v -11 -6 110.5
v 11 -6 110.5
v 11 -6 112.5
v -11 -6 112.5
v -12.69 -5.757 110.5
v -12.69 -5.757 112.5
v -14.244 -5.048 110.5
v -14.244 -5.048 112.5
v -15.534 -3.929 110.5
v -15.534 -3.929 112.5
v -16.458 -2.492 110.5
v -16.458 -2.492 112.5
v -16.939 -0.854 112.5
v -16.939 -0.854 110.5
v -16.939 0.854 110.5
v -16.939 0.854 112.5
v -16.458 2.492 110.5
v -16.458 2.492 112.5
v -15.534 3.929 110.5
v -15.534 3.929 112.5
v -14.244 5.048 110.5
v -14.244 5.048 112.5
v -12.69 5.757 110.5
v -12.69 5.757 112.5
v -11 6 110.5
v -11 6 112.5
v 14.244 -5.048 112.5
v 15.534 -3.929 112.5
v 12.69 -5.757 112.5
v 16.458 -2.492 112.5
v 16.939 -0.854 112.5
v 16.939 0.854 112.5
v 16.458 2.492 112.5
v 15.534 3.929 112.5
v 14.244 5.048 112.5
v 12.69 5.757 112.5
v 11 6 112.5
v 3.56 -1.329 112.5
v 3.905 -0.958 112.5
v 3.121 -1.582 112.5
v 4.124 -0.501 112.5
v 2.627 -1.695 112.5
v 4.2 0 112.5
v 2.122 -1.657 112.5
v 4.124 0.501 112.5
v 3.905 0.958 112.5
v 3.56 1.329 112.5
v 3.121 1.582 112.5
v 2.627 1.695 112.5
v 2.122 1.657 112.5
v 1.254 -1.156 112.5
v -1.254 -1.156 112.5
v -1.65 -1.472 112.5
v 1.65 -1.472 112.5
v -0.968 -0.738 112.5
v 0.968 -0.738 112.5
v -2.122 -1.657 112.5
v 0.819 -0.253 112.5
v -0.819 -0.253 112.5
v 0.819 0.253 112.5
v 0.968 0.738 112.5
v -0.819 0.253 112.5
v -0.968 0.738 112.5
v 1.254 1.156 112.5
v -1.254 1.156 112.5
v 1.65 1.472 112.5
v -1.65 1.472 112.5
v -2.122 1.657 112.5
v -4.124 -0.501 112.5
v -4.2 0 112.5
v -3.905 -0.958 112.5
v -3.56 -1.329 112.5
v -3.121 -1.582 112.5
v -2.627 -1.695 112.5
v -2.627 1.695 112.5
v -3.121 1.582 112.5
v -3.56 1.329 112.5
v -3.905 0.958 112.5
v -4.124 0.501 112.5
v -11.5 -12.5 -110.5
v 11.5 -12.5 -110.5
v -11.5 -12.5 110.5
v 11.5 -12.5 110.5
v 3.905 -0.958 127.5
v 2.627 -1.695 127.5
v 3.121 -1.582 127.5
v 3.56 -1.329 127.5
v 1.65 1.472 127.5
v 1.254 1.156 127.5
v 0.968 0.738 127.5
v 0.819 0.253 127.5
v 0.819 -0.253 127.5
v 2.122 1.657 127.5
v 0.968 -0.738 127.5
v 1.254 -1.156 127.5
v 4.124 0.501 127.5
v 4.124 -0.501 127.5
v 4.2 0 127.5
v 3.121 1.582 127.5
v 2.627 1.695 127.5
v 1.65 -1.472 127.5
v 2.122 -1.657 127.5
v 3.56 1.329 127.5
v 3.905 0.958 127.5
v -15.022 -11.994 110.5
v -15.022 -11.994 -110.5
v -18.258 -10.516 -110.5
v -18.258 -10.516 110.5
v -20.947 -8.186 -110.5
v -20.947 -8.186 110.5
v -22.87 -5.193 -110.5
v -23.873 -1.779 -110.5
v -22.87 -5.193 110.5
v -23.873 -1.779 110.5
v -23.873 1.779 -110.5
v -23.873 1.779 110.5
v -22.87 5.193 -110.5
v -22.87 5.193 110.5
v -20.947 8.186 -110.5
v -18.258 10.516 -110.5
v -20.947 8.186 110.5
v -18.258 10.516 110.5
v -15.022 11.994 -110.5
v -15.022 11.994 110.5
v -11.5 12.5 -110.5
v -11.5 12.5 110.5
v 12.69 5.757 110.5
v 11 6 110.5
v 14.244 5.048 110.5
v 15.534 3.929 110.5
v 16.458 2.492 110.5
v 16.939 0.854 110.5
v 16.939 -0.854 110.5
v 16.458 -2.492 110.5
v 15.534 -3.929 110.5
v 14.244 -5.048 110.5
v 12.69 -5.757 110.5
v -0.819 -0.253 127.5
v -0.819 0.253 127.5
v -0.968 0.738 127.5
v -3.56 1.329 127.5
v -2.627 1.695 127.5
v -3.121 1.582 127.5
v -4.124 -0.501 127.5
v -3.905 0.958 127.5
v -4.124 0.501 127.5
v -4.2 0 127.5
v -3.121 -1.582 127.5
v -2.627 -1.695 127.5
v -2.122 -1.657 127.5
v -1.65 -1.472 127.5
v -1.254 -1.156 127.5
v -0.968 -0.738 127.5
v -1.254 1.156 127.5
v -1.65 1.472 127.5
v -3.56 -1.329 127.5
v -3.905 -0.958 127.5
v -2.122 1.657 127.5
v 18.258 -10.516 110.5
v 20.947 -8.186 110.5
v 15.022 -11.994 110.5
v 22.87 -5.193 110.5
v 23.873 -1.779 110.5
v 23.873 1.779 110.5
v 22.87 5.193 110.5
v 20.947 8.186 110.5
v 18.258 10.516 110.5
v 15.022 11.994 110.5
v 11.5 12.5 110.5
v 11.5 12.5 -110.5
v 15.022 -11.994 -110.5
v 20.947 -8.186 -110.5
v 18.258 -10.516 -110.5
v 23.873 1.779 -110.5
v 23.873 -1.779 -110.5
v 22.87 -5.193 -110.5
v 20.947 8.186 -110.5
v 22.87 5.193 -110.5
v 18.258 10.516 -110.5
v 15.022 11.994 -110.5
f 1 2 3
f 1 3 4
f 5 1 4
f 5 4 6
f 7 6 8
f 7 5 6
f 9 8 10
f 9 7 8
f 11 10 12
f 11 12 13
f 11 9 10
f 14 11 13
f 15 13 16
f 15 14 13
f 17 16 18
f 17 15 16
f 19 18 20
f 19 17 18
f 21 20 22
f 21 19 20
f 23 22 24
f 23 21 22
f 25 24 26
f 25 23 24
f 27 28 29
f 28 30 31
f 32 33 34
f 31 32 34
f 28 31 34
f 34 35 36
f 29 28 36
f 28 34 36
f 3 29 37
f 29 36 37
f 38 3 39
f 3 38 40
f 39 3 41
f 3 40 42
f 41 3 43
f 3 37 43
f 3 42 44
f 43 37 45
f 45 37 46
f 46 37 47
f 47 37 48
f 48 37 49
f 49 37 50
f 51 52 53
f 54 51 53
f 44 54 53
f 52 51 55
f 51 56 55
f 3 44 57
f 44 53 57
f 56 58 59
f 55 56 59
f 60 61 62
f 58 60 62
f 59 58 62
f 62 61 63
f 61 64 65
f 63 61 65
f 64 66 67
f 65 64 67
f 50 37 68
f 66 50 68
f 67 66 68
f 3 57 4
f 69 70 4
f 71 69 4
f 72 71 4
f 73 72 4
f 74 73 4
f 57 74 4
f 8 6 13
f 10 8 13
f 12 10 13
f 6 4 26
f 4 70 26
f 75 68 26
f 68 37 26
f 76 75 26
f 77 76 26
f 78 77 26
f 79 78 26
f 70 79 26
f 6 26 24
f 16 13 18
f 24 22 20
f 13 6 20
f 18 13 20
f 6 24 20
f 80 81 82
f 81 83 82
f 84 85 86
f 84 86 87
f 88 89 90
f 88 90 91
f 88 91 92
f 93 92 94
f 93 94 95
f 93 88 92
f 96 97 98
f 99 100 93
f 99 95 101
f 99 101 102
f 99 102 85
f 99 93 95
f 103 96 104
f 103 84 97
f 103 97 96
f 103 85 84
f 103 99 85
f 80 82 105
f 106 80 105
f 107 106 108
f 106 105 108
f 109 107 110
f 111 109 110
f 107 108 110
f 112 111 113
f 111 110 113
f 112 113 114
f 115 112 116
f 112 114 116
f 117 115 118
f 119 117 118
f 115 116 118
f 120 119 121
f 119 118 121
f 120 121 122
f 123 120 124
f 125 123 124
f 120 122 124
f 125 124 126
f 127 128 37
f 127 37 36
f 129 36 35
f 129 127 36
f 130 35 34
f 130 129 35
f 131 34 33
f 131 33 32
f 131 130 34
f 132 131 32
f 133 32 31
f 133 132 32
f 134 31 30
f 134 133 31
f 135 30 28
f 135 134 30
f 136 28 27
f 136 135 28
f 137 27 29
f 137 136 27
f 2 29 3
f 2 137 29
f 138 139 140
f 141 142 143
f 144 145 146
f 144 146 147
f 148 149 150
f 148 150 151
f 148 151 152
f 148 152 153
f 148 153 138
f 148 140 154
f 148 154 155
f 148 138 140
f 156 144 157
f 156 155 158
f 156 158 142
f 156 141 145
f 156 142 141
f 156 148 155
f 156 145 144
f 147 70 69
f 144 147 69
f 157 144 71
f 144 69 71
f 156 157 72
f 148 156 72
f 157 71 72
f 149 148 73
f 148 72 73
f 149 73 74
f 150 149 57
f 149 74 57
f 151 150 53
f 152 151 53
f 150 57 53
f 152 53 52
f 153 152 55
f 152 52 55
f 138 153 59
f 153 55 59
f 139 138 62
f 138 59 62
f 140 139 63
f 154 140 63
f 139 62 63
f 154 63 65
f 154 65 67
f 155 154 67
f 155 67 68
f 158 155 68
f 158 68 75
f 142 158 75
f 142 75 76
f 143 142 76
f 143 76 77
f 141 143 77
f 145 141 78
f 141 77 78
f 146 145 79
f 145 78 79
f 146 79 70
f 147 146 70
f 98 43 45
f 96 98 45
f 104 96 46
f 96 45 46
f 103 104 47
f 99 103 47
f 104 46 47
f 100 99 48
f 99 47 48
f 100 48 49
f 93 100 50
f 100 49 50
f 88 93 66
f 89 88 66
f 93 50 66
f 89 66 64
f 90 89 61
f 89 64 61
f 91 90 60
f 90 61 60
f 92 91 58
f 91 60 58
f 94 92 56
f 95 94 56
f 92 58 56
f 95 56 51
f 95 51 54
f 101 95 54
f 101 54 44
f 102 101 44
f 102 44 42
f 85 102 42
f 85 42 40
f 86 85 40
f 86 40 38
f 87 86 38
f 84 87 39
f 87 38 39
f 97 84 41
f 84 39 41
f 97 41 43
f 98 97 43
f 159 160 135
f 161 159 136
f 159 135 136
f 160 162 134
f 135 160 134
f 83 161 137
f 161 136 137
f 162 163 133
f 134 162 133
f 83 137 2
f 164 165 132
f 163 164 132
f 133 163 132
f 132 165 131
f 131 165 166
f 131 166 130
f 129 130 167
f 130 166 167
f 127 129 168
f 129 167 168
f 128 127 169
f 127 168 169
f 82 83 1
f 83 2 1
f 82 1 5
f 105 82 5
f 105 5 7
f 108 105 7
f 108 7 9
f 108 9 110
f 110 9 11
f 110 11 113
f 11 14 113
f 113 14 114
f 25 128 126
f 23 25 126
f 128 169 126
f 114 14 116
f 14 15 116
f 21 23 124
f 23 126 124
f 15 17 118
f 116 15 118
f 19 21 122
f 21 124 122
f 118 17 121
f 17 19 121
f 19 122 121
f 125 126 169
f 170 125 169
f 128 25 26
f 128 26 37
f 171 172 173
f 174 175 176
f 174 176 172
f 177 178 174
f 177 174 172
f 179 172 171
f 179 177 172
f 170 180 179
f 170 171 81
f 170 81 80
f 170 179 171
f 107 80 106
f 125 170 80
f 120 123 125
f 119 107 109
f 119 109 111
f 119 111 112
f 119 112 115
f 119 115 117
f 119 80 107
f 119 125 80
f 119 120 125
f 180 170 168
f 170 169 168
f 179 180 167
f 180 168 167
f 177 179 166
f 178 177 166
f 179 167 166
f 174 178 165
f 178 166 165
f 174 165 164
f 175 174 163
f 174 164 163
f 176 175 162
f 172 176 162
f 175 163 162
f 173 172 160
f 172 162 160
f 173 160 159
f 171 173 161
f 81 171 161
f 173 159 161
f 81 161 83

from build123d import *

# Parameters (mm, degrees)
BOSS_EXTRU_1_DEPTH = 110.5
BOSS_EXTRU_2_DEPTH = 2
ESQUISSE3_R        = 1.7
BOSS_EXTRU_3_DEPTH = 15


with BuildPart() as part:
    # Esquisse1 → Boss.-Extru.1 (new, symmetric)
    with BuildSketch(Plane.XY):
        with BuildLine():
            Line((-11.5, 12.5), (11.5, 12.5))
            ThreePointArc((11.5, 12.5), (24, 0), (11.5, -12.5))
            Line((11.5, -12.5), (-11.5, -12.5))
            ThreePointArc((-11.5, -12.5), (-24, 0), (-11.5, 12.5))
        make_face()
    extrude(amount=BOSS_EXTRU_1_DEPTH, both=True)

    # Esquisse2 → Boss.-Extru.2 (add)
    with BuildSketch(Plane.XY.offset(110.5)):
        with BuildLine():
            Line((-11, 6), (11, 6))
            ThreePointArc((11, 6), (17, 0), (11, -6))
            Line((11, -6), (-11, -6))
            ThreePointArc((-11, -6), (-17, 0), (-11, 6))
        make_face()
    extrude(amount=BOSS_EXTRU_2_DEPTH)

    # Esquisse3 → Boss.-Extru.3 (add)
    with BuildSketch(Plane.XY.offset(112.5)):
        with Locations((2.5, 0)):
            Circle(ESQUISSE3_R)
        with Locations(Location((-2.5, 0, 0), (0, 0, 180))):
            Circle(ESQUISSE3_R)
    extrude(amount=BOSS_EXTRU_3_DEPTH)


solid = part.part
